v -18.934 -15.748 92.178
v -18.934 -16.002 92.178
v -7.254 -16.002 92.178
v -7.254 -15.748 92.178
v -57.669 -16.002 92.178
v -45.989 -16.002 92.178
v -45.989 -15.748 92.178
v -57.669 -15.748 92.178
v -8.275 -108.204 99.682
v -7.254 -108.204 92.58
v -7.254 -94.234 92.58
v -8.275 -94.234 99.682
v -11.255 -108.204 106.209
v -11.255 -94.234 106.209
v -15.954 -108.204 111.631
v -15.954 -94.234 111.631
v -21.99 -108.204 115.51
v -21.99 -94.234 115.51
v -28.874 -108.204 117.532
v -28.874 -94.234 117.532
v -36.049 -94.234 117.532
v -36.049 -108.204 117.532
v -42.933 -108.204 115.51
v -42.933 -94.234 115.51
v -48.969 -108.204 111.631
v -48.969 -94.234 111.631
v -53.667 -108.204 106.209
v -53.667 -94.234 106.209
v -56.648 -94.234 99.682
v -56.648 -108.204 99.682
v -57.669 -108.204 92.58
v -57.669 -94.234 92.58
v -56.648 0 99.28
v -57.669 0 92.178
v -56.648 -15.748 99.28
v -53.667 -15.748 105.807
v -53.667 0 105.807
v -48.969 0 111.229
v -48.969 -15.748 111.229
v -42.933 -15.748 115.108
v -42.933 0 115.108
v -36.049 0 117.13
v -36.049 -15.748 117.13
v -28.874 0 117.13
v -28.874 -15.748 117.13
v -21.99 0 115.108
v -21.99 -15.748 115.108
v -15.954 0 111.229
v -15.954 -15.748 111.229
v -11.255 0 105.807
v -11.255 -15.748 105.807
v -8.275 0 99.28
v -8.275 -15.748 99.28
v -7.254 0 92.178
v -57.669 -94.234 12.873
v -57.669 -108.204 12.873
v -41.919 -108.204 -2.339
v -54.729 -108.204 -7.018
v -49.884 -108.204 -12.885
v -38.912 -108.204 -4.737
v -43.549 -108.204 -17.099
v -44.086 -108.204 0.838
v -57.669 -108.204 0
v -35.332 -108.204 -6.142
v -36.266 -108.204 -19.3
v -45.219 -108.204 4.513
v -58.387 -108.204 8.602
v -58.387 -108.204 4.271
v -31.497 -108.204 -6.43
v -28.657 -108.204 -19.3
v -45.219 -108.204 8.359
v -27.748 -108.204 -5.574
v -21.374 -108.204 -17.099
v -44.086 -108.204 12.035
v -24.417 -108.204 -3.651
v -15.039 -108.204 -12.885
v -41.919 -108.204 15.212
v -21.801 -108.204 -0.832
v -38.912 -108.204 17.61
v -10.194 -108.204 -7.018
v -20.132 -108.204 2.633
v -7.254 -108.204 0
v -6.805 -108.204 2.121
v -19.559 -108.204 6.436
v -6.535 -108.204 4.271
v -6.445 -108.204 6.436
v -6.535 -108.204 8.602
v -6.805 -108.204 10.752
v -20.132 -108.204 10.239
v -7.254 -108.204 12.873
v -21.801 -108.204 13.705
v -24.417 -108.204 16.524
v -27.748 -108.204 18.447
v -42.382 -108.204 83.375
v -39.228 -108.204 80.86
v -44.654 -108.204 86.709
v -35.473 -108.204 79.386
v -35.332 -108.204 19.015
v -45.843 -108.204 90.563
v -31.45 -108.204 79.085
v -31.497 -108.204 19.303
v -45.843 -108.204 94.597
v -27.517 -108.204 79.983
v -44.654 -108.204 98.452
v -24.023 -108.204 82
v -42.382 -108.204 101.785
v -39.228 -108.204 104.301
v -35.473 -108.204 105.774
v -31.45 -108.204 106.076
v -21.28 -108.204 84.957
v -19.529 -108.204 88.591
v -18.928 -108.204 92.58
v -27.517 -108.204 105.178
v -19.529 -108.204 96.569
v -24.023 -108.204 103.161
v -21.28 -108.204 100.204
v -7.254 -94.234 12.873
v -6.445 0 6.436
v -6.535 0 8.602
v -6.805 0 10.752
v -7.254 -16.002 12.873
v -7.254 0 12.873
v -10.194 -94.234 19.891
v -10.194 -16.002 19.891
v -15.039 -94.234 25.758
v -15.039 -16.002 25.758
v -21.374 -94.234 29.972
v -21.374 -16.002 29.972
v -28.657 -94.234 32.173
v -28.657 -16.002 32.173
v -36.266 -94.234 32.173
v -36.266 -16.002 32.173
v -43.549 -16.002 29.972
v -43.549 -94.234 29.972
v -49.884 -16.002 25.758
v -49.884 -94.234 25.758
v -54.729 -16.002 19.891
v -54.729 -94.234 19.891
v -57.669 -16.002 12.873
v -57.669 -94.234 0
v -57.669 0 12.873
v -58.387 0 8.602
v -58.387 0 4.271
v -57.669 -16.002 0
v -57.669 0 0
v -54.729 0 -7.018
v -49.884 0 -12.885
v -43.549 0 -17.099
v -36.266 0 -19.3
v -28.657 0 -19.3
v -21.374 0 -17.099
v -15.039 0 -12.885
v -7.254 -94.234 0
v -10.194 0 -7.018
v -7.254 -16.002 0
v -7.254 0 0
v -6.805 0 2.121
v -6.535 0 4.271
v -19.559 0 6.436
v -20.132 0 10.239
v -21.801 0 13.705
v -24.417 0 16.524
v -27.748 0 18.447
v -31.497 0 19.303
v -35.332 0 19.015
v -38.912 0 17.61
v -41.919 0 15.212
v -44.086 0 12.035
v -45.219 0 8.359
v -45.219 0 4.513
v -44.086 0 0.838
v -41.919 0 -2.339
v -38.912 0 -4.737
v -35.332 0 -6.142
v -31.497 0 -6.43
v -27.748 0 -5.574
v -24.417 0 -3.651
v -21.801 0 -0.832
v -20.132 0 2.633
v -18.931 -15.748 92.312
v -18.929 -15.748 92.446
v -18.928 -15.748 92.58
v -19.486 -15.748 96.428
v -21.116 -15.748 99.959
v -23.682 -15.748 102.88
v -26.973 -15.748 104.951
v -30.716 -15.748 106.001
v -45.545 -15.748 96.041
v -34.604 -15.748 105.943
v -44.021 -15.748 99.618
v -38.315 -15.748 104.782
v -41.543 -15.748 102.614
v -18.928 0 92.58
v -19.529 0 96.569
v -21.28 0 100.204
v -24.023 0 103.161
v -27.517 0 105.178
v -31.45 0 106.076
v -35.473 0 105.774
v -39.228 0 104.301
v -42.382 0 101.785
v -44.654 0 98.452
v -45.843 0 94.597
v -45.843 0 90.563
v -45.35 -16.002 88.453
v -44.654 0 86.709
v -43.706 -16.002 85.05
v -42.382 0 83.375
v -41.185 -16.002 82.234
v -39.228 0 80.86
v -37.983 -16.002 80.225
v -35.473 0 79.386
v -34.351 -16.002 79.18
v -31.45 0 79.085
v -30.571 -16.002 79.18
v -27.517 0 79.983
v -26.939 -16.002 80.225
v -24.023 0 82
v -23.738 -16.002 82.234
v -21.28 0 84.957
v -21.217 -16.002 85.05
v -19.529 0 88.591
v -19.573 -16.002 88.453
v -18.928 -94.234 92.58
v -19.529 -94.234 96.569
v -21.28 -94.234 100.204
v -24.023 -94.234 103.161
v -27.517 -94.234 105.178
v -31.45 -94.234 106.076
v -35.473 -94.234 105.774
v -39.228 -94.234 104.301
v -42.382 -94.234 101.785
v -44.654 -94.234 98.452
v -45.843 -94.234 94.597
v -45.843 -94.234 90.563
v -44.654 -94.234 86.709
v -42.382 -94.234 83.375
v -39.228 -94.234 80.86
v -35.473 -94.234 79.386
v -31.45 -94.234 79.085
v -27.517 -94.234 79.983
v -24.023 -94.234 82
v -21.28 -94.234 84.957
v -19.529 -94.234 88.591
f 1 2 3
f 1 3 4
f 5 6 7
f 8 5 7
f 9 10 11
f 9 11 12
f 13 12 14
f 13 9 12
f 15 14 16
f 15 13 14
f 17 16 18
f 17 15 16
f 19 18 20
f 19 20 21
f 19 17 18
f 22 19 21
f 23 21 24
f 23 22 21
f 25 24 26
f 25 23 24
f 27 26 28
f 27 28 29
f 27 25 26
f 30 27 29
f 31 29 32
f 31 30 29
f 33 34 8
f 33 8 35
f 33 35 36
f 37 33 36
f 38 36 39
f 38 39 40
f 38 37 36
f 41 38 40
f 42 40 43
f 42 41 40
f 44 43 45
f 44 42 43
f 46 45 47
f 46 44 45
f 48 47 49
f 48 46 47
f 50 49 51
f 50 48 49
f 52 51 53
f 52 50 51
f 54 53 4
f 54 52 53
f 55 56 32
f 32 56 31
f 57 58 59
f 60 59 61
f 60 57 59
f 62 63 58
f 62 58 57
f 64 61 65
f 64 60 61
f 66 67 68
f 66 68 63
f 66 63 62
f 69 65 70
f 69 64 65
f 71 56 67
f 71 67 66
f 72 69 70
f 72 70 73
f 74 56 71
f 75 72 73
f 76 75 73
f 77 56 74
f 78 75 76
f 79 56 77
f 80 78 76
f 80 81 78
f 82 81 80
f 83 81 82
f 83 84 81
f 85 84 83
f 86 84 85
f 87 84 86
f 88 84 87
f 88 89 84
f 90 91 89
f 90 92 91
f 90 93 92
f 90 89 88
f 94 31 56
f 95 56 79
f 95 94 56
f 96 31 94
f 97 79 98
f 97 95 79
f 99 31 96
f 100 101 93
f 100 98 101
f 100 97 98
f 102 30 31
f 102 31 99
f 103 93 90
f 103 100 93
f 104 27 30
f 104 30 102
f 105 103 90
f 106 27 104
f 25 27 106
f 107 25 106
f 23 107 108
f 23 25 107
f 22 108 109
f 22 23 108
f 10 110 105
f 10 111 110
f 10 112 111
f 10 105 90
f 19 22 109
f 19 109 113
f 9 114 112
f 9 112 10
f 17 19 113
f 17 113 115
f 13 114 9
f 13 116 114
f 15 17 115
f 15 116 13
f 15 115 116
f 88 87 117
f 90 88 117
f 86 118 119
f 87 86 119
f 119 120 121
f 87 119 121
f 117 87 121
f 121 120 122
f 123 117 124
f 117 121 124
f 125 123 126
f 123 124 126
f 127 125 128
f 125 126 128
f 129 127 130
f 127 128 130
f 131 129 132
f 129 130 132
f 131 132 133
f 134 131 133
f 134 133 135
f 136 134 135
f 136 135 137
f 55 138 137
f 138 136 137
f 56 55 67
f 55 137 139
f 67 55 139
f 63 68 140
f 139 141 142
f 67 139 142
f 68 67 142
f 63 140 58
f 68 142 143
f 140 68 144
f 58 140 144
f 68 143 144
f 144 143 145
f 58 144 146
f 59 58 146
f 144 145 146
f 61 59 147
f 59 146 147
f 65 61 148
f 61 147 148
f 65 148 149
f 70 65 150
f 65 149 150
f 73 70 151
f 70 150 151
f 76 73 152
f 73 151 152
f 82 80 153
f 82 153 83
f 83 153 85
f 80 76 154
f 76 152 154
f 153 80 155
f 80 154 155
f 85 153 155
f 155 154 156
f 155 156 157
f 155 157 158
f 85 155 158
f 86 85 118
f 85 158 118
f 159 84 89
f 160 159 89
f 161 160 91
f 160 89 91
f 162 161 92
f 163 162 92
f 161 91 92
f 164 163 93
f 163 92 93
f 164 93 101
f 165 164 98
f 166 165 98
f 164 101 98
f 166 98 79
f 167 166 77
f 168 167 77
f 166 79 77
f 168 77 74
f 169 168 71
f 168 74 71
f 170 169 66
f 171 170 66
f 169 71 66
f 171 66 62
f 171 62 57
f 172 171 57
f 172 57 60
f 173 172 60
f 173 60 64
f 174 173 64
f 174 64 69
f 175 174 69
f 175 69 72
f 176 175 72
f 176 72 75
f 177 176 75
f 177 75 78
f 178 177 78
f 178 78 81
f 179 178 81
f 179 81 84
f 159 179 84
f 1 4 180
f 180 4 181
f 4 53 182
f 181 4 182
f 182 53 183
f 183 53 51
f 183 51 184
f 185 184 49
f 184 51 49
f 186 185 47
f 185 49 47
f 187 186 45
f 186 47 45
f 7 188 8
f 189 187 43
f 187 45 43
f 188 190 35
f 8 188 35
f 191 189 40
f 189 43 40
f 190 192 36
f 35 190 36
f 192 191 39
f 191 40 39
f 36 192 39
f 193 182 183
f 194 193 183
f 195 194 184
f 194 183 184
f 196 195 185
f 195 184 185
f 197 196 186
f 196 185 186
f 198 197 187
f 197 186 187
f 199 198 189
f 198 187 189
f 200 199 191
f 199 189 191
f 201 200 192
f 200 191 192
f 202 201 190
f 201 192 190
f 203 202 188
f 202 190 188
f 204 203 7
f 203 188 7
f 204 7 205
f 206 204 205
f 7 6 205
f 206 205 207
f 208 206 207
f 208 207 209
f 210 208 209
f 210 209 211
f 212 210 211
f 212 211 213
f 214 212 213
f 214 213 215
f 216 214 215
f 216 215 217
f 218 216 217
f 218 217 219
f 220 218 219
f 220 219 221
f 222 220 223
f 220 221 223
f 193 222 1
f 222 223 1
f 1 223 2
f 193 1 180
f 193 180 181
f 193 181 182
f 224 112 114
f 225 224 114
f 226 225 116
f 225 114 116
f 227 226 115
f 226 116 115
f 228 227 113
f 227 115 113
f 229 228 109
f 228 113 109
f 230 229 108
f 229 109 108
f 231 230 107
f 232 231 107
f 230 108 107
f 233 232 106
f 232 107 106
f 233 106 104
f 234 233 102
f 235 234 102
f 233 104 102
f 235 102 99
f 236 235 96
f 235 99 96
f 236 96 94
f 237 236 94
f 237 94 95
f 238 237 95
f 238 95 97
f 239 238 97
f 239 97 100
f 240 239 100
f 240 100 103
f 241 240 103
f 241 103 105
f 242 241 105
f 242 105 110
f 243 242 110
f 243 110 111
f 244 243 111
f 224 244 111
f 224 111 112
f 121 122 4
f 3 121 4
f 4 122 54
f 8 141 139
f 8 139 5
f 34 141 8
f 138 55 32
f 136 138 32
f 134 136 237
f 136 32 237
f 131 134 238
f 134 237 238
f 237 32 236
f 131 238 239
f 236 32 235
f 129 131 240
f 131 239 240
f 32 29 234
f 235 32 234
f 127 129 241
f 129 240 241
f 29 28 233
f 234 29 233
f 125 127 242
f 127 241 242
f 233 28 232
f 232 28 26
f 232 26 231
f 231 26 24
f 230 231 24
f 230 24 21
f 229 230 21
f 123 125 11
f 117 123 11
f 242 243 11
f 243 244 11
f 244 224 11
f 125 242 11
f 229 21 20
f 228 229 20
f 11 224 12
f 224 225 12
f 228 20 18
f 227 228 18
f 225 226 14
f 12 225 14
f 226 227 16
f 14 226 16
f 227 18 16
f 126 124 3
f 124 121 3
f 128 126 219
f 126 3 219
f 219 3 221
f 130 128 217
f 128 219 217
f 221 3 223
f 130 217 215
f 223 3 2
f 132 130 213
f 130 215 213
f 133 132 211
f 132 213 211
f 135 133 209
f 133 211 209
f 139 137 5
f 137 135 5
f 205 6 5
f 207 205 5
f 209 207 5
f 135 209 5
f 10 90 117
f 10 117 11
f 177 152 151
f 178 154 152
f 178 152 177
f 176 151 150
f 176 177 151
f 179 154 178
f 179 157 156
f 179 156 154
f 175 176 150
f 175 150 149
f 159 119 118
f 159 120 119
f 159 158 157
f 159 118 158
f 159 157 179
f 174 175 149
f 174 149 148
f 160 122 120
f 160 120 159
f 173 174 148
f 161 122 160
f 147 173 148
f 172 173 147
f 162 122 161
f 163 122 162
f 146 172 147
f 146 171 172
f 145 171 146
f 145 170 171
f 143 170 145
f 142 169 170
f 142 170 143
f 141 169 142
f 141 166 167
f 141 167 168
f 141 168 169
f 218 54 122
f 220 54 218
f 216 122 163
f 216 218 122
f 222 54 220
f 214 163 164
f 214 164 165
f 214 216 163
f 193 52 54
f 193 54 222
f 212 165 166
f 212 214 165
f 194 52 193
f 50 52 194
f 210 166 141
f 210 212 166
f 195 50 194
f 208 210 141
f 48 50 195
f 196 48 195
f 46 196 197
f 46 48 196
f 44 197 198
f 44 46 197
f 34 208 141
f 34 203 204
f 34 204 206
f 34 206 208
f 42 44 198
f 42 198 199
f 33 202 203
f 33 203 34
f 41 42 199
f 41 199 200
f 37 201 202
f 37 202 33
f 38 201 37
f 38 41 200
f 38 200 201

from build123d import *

# Parameters (mm, degrees)
F0_R      = 26.0164599328
F1_DEPTH  = 108.204
F2_W      = 50.4153975605
F2_H      = 92.5804451108
F3_DEPTH  = 13.97
F4_W      = 50.4153975605
F4_H      = 99.2666035891
F5_DEPTH  = 16.002
F6_W      = 16.002
F6_H      = 7.0882067084
F7_DEPTH  = 64.008
F8_R      = 12.9022316947
F9_DEPTH  = 152.146
F11_DEPTH = 15.748
F13_DEPTH = 13.97
F14_R     = 13.5333252063
F15_DEPTH = 238.252


with BuildPart() as f1:
    # F0 (on Front) → F1 (new body)
    with BuildSketch(Plane.XZ):
        with Locations((-32.4612818658, 6.4364671707)):
            Circle(F0_R)
    extrude(amount=F1_DEPTH)

    # F2 (on face) → F3 (join)
    with BuildSketch(Plane.XZ.offset(108.204)):
        with Locations((-32.4612818658, 46.2902225554)):
            Rectangle(F2_W, F2_H)
    extrude(amount=-F3_DEPTH)

    # F4 (on face) → F5 (join)
    with BuildSketch(Plane(origin=(0, 0, 0), x_dir=(-1, 0, 0), z_dir=(0, 1, 0))):
        with Locations((32.4612818658, 49.6333017945)):
            Rectangle(F4_W, F4_H)
    extrude(amount=-F5_DEPTH)

    # F6 (on face) → F7 (cut)
    with BuildSketch(Plane.YZ.offset(-7.2535830856)):
        with Locations((-8.001, 95.7225002348)):
            Rectangle(F6_W, F6_H)
    extrude(amount=-F7_DEPTH, mode=Mode.SUBTRACT)

    # F8 (on face) → F9 (cut)
    with BuildSketch(Plane.XZ.offset(108.204)):
        with Locations((-32.4612818658, 6.4364671707)):
            Circle(F8_R)
    extrude(amount=-F9_DEPTH, mode=Mode.SUBTRACT)

    # F10 (on face) → F11 (join)
    with BuildSketch(Plane(origin=(0, 0, 0), x_dir=(-1, 0, 0), z_dir=(0, 1, 0))):
        with BuildLine():
            Line((7.2535830856, 92.1783968806), (57.6689806461, 92.1783968806))
            ThreePointArc((57.6689806461, 92.1783968806), (32.4612818658, 117.3860956609), (7.2535830856, 92.1783968806))
        make_face()
    extrude(amount=-F11_DEPTH)

    # F12 (on face) → F13 (join)
    with BuildSketch(Plane.XZ.offset(108.204)):
        with BuildLine():
            Line((-57.6689806461, 92.5804451108), (-7.2535830856, 92.5804451108))
            ThreePointArc((-7.2535830856, 92.5804451108), (-32.4612818658, 117.7881438911), (-57.6689806461, 92.5804451108))
        make_face()
    extrude(amount=-F13_DEPTH)

    # F14 (on face) → F15 (cut)
    with BuildSketch(Plane.XZ.offset(108.204)):
        with Locations((-32.4612818658, 92.5804451108)):
            Circle(F14_R)
    extrude(amount=-F15_DEPTH, mode=Mode.SUBTRACT)


solid = f1.part
